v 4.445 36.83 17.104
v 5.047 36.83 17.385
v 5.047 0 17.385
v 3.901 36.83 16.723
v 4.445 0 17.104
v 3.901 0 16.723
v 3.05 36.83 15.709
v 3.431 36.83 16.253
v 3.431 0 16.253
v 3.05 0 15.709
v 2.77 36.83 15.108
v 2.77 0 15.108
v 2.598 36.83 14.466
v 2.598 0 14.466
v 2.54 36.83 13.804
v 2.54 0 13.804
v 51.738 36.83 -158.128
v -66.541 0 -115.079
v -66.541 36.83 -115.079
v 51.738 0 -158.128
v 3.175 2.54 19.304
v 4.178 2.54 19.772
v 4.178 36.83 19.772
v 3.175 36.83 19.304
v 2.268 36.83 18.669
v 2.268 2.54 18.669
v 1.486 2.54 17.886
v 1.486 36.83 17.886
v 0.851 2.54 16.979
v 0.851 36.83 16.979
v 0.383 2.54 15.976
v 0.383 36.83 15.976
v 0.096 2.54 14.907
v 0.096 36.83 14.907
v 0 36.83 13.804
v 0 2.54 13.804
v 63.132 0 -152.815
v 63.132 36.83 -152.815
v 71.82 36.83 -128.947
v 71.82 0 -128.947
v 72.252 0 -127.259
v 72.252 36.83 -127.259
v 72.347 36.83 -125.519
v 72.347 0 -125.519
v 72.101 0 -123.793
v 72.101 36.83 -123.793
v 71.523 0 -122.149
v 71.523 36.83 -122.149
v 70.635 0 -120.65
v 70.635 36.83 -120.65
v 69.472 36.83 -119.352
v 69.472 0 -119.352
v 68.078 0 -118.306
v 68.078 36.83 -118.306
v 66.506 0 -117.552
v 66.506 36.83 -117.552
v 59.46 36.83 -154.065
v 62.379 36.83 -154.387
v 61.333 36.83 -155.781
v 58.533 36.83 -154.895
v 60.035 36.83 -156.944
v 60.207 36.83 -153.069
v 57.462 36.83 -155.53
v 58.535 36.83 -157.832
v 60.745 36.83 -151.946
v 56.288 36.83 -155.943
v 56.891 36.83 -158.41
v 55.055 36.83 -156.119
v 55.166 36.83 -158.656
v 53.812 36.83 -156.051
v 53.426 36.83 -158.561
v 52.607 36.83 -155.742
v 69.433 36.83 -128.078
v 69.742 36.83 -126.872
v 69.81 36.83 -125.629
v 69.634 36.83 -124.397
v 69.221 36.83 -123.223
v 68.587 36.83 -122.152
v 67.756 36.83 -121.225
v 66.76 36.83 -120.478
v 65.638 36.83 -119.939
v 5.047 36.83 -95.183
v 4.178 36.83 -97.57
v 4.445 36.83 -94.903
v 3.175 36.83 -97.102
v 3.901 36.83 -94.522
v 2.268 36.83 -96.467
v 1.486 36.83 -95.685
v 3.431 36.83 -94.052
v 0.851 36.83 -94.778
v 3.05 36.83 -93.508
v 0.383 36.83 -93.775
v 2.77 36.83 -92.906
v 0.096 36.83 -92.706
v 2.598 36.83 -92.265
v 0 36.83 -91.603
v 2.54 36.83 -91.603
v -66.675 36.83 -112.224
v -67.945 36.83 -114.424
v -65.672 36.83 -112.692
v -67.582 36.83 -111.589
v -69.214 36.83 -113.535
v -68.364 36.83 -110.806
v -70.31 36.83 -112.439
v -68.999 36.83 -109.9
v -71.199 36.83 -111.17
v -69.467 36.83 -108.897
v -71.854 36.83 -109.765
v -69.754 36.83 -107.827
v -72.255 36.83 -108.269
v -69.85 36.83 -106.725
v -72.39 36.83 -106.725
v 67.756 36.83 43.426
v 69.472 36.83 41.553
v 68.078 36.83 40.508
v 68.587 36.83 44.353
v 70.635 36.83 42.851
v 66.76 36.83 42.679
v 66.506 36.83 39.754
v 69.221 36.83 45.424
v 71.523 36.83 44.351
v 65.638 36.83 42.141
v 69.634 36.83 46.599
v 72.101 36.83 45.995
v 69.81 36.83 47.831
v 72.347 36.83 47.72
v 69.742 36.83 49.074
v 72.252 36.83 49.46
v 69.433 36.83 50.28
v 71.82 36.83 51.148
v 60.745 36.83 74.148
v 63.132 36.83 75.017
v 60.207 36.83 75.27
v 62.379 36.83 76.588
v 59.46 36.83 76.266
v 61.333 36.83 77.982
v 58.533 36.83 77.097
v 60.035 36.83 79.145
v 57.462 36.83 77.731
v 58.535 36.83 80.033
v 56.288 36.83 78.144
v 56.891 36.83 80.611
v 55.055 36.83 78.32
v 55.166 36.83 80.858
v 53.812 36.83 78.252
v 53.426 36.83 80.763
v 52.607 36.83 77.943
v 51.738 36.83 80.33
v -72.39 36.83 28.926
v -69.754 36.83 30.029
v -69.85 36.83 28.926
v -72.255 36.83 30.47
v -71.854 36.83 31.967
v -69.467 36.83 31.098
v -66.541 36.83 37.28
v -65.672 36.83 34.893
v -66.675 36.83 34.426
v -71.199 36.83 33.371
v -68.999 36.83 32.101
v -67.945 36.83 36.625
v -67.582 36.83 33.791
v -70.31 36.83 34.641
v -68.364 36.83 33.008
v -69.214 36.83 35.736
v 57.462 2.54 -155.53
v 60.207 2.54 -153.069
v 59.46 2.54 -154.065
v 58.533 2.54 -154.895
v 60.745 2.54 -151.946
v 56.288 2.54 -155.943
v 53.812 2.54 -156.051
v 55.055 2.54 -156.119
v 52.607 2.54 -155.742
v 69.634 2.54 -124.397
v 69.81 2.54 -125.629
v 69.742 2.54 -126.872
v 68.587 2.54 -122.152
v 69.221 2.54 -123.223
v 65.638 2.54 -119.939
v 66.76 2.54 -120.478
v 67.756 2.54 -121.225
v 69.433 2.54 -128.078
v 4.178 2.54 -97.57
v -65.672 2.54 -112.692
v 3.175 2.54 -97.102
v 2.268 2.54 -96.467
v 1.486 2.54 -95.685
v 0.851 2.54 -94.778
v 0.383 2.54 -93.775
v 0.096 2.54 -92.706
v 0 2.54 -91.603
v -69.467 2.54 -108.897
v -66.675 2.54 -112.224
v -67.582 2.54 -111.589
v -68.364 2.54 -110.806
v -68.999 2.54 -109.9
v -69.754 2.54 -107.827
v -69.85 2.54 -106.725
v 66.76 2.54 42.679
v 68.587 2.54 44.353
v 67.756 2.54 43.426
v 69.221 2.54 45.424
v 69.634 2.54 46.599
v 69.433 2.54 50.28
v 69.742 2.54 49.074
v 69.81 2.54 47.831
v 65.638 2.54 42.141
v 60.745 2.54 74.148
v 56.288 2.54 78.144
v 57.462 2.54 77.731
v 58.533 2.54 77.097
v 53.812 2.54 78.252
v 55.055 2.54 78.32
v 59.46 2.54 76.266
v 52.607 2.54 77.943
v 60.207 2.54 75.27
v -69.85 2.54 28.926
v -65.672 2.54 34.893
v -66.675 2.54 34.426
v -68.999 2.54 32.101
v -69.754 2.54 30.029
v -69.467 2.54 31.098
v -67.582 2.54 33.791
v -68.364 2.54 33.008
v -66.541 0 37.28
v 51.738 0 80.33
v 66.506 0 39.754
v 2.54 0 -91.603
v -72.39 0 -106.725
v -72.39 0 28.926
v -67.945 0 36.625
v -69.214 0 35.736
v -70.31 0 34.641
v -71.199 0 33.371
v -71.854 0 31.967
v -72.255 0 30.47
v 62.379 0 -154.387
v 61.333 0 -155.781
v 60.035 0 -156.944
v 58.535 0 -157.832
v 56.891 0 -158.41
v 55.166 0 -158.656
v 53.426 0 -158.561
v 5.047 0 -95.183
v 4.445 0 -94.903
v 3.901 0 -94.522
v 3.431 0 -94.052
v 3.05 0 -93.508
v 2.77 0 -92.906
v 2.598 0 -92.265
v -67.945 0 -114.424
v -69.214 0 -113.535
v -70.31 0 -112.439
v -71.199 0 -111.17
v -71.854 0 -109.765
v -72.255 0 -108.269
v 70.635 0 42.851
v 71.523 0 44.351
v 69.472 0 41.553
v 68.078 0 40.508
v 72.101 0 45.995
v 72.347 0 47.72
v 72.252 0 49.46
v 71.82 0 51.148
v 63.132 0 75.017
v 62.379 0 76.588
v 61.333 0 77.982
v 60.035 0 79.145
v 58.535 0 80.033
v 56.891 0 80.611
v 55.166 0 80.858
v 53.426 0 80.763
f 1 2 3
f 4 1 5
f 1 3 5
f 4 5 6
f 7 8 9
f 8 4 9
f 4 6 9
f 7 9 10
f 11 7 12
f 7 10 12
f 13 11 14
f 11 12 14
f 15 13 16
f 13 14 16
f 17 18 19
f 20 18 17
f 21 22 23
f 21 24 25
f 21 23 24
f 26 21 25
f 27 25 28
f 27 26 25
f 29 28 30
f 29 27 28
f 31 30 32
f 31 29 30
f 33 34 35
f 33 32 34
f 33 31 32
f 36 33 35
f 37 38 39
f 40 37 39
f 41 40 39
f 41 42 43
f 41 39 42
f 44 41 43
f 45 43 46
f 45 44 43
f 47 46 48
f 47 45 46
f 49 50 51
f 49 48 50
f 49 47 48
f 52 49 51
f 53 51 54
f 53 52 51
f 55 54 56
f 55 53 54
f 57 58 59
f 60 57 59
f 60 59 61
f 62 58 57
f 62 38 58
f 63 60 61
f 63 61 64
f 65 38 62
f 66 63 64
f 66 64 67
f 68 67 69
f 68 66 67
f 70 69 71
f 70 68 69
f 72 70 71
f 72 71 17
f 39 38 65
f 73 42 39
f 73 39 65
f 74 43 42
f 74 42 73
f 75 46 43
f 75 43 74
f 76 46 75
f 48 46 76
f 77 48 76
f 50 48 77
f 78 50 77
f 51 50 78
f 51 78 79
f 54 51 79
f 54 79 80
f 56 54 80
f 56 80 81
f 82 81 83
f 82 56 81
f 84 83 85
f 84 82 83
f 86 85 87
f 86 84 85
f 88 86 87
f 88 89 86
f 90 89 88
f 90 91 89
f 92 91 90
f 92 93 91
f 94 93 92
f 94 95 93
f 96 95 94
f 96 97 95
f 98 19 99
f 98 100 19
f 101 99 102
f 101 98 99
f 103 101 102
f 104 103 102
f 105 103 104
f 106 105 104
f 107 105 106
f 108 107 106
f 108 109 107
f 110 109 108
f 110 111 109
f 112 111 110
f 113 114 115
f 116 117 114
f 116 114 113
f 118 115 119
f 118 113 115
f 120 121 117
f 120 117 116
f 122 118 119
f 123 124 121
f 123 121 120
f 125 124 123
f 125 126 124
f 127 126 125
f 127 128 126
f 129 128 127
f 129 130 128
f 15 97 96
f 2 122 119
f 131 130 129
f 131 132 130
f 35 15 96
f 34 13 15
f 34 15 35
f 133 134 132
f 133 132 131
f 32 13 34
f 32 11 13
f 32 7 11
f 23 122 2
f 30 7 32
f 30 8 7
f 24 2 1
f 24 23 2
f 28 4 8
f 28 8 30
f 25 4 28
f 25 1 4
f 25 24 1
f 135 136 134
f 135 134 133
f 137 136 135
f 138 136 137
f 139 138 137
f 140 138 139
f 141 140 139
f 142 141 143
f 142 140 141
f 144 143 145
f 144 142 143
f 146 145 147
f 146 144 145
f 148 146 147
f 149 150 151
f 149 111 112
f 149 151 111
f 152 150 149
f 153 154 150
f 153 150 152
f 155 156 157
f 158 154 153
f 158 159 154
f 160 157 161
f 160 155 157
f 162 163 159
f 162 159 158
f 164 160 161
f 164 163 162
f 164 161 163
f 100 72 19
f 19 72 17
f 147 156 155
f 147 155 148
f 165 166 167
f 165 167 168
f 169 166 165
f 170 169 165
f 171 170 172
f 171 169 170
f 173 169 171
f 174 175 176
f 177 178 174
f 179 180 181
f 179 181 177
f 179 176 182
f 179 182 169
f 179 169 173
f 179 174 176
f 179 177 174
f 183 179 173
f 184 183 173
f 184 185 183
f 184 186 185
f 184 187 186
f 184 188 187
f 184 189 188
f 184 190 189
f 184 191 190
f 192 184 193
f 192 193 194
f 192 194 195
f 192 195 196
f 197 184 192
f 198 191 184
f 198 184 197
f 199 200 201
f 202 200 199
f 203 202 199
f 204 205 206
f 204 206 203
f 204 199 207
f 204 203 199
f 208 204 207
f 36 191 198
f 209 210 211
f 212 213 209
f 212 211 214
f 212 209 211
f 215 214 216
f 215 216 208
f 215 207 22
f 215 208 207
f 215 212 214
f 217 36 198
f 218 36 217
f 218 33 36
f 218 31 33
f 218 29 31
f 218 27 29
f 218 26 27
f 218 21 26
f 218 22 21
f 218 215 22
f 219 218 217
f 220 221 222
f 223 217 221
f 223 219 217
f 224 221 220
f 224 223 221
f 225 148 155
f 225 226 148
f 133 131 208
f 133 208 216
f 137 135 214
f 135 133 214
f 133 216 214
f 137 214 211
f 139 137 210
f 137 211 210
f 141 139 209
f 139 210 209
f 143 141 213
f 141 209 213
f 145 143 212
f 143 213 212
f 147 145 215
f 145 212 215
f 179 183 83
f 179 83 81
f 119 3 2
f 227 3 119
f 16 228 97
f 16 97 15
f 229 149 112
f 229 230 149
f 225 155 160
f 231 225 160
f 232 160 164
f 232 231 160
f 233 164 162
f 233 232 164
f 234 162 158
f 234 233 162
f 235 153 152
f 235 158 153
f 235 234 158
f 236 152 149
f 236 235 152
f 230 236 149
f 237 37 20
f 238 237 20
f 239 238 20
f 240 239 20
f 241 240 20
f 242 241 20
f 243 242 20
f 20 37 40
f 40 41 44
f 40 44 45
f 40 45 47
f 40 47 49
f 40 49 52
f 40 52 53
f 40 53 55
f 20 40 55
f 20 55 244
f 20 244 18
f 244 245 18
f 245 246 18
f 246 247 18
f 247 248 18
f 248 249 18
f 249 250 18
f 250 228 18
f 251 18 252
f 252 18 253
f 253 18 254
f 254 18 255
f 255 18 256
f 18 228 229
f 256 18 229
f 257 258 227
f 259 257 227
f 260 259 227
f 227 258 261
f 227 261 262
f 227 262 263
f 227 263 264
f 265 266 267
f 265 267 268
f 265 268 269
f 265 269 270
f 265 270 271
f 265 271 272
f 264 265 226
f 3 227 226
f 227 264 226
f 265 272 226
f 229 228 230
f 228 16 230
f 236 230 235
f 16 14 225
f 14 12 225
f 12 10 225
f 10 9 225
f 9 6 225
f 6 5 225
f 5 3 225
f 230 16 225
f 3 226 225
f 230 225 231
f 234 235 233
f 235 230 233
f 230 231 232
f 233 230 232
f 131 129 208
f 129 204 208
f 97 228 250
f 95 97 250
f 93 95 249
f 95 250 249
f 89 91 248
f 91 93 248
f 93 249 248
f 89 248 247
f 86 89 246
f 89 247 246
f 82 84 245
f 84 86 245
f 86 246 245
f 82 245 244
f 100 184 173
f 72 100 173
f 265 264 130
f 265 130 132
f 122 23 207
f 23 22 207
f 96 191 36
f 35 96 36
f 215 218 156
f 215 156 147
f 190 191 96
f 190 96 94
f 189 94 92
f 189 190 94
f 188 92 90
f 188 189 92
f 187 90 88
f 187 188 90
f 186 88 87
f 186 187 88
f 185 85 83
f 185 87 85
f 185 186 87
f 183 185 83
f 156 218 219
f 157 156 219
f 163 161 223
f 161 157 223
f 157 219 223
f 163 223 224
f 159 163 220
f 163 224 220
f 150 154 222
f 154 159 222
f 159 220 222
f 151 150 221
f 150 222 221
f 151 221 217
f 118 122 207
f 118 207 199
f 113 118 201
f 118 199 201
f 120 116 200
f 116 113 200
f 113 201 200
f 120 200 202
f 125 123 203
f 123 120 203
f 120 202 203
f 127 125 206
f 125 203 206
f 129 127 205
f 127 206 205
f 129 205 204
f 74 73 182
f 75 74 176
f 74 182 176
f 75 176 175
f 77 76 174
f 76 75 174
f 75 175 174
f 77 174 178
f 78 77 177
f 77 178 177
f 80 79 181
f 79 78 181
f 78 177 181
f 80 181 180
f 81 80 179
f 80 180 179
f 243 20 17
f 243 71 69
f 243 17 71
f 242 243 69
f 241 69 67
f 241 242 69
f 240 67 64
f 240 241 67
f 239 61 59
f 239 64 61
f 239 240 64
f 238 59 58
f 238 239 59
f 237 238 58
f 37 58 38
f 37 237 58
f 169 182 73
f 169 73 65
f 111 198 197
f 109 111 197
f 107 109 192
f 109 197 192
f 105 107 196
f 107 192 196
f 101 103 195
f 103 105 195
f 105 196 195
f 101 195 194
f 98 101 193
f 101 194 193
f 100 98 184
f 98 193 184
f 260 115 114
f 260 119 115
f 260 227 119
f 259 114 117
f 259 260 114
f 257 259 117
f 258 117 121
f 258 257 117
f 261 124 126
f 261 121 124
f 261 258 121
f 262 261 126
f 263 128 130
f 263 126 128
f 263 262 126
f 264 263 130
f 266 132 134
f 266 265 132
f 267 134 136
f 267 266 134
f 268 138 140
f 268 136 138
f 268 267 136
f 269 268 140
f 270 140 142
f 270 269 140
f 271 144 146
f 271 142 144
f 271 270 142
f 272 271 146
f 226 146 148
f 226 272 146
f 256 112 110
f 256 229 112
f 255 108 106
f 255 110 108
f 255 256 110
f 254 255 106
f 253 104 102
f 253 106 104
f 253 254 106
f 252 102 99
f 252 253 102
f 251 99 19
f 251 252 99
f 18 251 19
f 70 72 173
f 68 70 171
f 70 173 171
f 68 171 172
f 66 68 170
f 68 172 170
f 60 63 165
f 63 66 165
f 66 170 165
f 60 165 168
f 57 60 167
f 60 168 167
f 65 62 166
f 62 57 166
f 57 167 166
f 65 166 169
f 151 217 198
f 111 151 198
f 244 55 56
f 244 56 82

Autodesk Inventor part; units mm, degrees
ref_plane "YZ Plane" through (0, 0, 0) normal (1, 0, 0) x (0, 1, 0)
ref_plane "XZ Plane" through (0, 0, 0) normal (0, 1, 0) x (-1, 0, 0)
ref_plane "XY Plane" through (0, 0, 0) normal (0, 0, 1) x (1, 0, 0)
sketch "Sketch1" plane through (0, 0, 0) normal (0, 1, 0) x (-1, 0, 0)
  circle A0 centre (34.925, 5.5508) radius 13.97
  line L0 (69.85, 28.9263) -> (69.85, -106.7248)
  line L1 (0, -91.6029) -> (0, 13.8044)
  line L2 (-4.1782, 19.7715) -> (-65.6375, 42.1409)
  line L3 (-4.1782, -97.57) -> (-65.6375, -119.9394)
  line L4 (65.6718, 34.8933) -> (-52.6066, 77.9431)
  line L5 (65.6718, -112.6918) -> (-52.6066, -155.7416)
  line L6 (-69.4327, 50.2797) -> (-60.7454, 74.1479)
  line L7 (-69.4327, -128.0782) -> (-60.7454, -151.9464)
  arc A1 (-69.4327, 50.2797) -> (-65.6375, 42.1409) centre (-63.4657, 48.1079) ccw
  arc A2 (-52.6066, 77.9431) -> (-60.7454, 74.1479) centre (-54.7784, 71.9761) ccw
  arc A3 (-65.6375, -119.9394) -> (-69.4327, -128.0782) centre (-63.4657, -125.9064) ccw
  arc A4 (-60.7454, -151.9464) -> (-52.6066, -155.7416) centre (-54.7784, -149.7746) ccw
  arc A5 (69.85, 28.9263) -> (65.6718, 34.8933) centre (63.5, 28.9263) ccw
  arc A6 (65.6718, -112.6918) -> (69.85, -106.7248) centre (63.5, -106.7248) ccw
  arc A7 (-4.1782, -97.57) -> (0, -91.6029) centre (-6.35, -91.6029) ccw
  arc A8 (0, 13.8044) -> (-4.1782, 19.7715) centre (-6.35, 13.8044) ccw
  line L8 (-51.7378, 80.33) -> (66.5406, 37.2802)
  arc A9 (72.39, 28.9263) -> (66.5406, 37.2802) centre (63.5, 28.9263) ccw
  line L9 (72.39, 28.9263) -> (72.39, -106.7248)
  arc A10 (66.5406, -115.0786) -> (72.39, -106.7248) centre (63.5, -106.7248) ccw
  line L10 (66.5406, -115.0786) -> (-51.7378, -158.1285)
  arc A11 (-63.1323, -152.8152) -> (-51.7378, -158.1285) centre (-54.7784, -149.7746) ccw
  line L11 (-63.1323, -152.8152) -> (-71.8196, -128.947)
  arc A12 (-66.5063, -117.5525) -> (-71.8196, -128.947) centre (-63.4657, -125.9064) ccw
  line L12 (-66.5063, -117.5525) -> (-5.0469, -95.1832)
  arc A13 (-5.0469, -95.1832) -> (-2.54, -91.6029) centre (-6.35, -91.6029) ccw
  line L13 (-2.54, -91.6029) -> (-2.54, 13.8044)
  arc A14 (-2.54, 13.8044) -> (-5.0469, 17.3847) centre (-6.35, 13.8044) ccw
  line L14 (-5.0469, 17.3847) -> (-66.5063, 39.754)
  arc A15 (-71.8196, 51.1485) -> (-66.5063, 39.754) centre (-63.4657, 48.1079) ccw
  line L15 (-71.8196, 51.1485) -> (-63.1323, 75.0167)
  arc A16 (-51.7378, 80.33) -> (-63.1323, 75.0167) centre (-54.7784, 71.9761) ccw
  point P0 (0, 0)
  point P1 (0, 0)
  point P2 (0, 18.2508)
  point P3 (0, -96.0492)
  point P4 (-71.6046, 44.3127)
  point P5 (-71.6046, -122.1112)
  point P6 (69.85, 33.3726)
  point P7 (-58.5736, 80.115)
  point P8 (69.85, -111.1711)
  point P9 (-58.5736, -157.9135)
  dimension "d0" = 27.94
  dimension "d1" = 114.3
  dimension "d2" = 76.2
  dimension "d3" = 110
  dimension "d4" = 76.2
  dimension "d5" = 110
  dimension "d6" = 38.1
  dimension "d7" = 38.1
  dimension "d8" = 34.925
  dimension "d9" = 12.7
  dimension "d10" = 6.35
  dimension "d11" = 6.35
  dimension "d12" = 69.85
  dimension "d13" = 2.54
extrude "Extrusion1" add sketch "Sketch1" along normal blind 36.83 contours L8 A9 L9 A10 L10 A11 L11 A12 L12 A13 L13 A14 L14 A15 L15 A16
sketch "Sketch4" plane through (0, 0, 0) normal (0, 1, 0) x (-1, 0, 0)
  arc A0 (65.6718, -112.6918) -> (69.85, -106.7248) centre (63.5, -106.7248) ccw
  line L0 (-4.1782, -97.57) -> (-65.6375, -119.9394)
  line L1 (65.6718, -112.6918) -> (-52.6066, -155.7416)
  arc A1 (-4.1782, -97.57) -> (0, -91.6029) centre (-6.35, -91.6029) ccw
  line L2 (-4.1782, 19.7715) -> (-65.6375, 42.1409)
  arc A2 (-65.6375, -119.9394) -> (-69.4327, -128.0782) centre (-63.4657, -125.9064) ccw
  line L3 (-69.4327, -128.0782) -> (-60.7454, -151.9464)
  arc A3 (-60.7454, -151.9464) -> (-52.6066, -155.7416) centre (-54.7784, -149.7746) ccw
  line L4 (0, -91.6029) -> (0, 13.8044)
  line L5 (69.85, 28.9263) -> (69.85, -106.7248)
  arc A4 (0, 13.8044) -> (-4.1782, 19.7715) centre (-6.35, 13.8044) ccw
  arc A5 (69.85, 28.9263) -> (65.6718, 34.8933) centre (63.5, 28.9263) ccw
  line L6 (65.6718, 34.8933) -> (-52.6066, 77.9431)
  line L7 (-69.4327, 50.2797) -> (-60.7454, 74.1479)
  arc A6 (-52.6066, 77.9431) -> (-60.7454, 74.1479) centre (-54.7784, 71.9761) ccw
  arc A7 (-69.4327, 50.2797) -> (-65.6375, 42.1409) centre (-63.4657, 48.1079) ccw
  line L8 (-51.7378, 80.33) -> (66.5406, 37.2802)
  arc A8 (72.39, 28.9263) -> (66.5406, 37.2802) centre (63.5, 28.9263) ccw
  line L9 (72.39, 28.9263) -> (72.39, -106.7248)
  arc A9 (66.5406, -115.0786) -> (72.39, -106.7248) centre (63.5, -106.7248) ccw
  line L10 (66.5406, -115.0786) -> (-51.7378, -158.1285)
  arc A10 (-63.1323, -152.8152) -> (-51.7378, -158.1285) centre (-54.7784, -149.7746) ccw
  line L11 (-63.1323, -152.8152) -> (-71.8196, -128.947)
  arc A11 (-66.5063, -117.5525) -> (-71.8196, -128.947) centre (-63.4657, -125.9064) ccw
  line L12 (-66.5063, -117.5525) -> (-5.0469, -95.1832)
  arc A12 (-5.0469, -95.1832) -> (-2.54, -91.6029) centre (-6.35, -91.6029) ccw
  line L13 (-2.54, -91.6029) -> (-2.54, 13.8044)
  arc A13 (-2.54, 13.8044) -> (-5.0469, 17.3847) centre (-6.35, 13.8044) ccw
  line L14 (-5.0469, 17.3847) -> (-66.5063, 39.754)
  arc A14 (-71.8196, 51.1485) -> (-66.5063, 39.754) centre (-63.4657, 48.1079) ccw
  line L15 (-71.8196, 51.1485) -> (-63.1323, 75.0167)
  arc A15 (-51.7378, 80.33) -> (-63.1323, 75.0167) centre (-54.7784, 71.9761) ccw
  point P0 (0, 0)
  point P1 (0, 0)
  point P2 (0, -96.0492)
  point P3 (69.85, -111.1711)
  point P4 (-71.6046, -122.1112)
  point P5 (-58.5736, -157.9135)
  point P6 (0, 18.2508)
  point P7 (-71.6046, 44.3127)
  point P8 (69.85, 33.3726)
  point P9 (-58.5736, 80.115)
  point P10 (0, 0)
  dimension "d17" = 114.3
  dimension "d18" = 76.2
  dimension "d19" = 110
  dimension "d20" = 76.2
  dimension "d21" = 110
  dimension "d22" = 38.1
  dimension "d23" = 38.1
  dimension "d26" = 6.35
  dimension "d27" = 6.35
  dimension "d28" = 69.85
  dimension "d29" = 2.54
extrude "Extrusion2" add sketch "Sketch4" along normal blind 2.54 contours L1 A3 L3 A2 L0 A1 L4 A4 L2 A7 L7 A6 L6 A5 L5 A0
properties part number "CONTROLLER CASE"
